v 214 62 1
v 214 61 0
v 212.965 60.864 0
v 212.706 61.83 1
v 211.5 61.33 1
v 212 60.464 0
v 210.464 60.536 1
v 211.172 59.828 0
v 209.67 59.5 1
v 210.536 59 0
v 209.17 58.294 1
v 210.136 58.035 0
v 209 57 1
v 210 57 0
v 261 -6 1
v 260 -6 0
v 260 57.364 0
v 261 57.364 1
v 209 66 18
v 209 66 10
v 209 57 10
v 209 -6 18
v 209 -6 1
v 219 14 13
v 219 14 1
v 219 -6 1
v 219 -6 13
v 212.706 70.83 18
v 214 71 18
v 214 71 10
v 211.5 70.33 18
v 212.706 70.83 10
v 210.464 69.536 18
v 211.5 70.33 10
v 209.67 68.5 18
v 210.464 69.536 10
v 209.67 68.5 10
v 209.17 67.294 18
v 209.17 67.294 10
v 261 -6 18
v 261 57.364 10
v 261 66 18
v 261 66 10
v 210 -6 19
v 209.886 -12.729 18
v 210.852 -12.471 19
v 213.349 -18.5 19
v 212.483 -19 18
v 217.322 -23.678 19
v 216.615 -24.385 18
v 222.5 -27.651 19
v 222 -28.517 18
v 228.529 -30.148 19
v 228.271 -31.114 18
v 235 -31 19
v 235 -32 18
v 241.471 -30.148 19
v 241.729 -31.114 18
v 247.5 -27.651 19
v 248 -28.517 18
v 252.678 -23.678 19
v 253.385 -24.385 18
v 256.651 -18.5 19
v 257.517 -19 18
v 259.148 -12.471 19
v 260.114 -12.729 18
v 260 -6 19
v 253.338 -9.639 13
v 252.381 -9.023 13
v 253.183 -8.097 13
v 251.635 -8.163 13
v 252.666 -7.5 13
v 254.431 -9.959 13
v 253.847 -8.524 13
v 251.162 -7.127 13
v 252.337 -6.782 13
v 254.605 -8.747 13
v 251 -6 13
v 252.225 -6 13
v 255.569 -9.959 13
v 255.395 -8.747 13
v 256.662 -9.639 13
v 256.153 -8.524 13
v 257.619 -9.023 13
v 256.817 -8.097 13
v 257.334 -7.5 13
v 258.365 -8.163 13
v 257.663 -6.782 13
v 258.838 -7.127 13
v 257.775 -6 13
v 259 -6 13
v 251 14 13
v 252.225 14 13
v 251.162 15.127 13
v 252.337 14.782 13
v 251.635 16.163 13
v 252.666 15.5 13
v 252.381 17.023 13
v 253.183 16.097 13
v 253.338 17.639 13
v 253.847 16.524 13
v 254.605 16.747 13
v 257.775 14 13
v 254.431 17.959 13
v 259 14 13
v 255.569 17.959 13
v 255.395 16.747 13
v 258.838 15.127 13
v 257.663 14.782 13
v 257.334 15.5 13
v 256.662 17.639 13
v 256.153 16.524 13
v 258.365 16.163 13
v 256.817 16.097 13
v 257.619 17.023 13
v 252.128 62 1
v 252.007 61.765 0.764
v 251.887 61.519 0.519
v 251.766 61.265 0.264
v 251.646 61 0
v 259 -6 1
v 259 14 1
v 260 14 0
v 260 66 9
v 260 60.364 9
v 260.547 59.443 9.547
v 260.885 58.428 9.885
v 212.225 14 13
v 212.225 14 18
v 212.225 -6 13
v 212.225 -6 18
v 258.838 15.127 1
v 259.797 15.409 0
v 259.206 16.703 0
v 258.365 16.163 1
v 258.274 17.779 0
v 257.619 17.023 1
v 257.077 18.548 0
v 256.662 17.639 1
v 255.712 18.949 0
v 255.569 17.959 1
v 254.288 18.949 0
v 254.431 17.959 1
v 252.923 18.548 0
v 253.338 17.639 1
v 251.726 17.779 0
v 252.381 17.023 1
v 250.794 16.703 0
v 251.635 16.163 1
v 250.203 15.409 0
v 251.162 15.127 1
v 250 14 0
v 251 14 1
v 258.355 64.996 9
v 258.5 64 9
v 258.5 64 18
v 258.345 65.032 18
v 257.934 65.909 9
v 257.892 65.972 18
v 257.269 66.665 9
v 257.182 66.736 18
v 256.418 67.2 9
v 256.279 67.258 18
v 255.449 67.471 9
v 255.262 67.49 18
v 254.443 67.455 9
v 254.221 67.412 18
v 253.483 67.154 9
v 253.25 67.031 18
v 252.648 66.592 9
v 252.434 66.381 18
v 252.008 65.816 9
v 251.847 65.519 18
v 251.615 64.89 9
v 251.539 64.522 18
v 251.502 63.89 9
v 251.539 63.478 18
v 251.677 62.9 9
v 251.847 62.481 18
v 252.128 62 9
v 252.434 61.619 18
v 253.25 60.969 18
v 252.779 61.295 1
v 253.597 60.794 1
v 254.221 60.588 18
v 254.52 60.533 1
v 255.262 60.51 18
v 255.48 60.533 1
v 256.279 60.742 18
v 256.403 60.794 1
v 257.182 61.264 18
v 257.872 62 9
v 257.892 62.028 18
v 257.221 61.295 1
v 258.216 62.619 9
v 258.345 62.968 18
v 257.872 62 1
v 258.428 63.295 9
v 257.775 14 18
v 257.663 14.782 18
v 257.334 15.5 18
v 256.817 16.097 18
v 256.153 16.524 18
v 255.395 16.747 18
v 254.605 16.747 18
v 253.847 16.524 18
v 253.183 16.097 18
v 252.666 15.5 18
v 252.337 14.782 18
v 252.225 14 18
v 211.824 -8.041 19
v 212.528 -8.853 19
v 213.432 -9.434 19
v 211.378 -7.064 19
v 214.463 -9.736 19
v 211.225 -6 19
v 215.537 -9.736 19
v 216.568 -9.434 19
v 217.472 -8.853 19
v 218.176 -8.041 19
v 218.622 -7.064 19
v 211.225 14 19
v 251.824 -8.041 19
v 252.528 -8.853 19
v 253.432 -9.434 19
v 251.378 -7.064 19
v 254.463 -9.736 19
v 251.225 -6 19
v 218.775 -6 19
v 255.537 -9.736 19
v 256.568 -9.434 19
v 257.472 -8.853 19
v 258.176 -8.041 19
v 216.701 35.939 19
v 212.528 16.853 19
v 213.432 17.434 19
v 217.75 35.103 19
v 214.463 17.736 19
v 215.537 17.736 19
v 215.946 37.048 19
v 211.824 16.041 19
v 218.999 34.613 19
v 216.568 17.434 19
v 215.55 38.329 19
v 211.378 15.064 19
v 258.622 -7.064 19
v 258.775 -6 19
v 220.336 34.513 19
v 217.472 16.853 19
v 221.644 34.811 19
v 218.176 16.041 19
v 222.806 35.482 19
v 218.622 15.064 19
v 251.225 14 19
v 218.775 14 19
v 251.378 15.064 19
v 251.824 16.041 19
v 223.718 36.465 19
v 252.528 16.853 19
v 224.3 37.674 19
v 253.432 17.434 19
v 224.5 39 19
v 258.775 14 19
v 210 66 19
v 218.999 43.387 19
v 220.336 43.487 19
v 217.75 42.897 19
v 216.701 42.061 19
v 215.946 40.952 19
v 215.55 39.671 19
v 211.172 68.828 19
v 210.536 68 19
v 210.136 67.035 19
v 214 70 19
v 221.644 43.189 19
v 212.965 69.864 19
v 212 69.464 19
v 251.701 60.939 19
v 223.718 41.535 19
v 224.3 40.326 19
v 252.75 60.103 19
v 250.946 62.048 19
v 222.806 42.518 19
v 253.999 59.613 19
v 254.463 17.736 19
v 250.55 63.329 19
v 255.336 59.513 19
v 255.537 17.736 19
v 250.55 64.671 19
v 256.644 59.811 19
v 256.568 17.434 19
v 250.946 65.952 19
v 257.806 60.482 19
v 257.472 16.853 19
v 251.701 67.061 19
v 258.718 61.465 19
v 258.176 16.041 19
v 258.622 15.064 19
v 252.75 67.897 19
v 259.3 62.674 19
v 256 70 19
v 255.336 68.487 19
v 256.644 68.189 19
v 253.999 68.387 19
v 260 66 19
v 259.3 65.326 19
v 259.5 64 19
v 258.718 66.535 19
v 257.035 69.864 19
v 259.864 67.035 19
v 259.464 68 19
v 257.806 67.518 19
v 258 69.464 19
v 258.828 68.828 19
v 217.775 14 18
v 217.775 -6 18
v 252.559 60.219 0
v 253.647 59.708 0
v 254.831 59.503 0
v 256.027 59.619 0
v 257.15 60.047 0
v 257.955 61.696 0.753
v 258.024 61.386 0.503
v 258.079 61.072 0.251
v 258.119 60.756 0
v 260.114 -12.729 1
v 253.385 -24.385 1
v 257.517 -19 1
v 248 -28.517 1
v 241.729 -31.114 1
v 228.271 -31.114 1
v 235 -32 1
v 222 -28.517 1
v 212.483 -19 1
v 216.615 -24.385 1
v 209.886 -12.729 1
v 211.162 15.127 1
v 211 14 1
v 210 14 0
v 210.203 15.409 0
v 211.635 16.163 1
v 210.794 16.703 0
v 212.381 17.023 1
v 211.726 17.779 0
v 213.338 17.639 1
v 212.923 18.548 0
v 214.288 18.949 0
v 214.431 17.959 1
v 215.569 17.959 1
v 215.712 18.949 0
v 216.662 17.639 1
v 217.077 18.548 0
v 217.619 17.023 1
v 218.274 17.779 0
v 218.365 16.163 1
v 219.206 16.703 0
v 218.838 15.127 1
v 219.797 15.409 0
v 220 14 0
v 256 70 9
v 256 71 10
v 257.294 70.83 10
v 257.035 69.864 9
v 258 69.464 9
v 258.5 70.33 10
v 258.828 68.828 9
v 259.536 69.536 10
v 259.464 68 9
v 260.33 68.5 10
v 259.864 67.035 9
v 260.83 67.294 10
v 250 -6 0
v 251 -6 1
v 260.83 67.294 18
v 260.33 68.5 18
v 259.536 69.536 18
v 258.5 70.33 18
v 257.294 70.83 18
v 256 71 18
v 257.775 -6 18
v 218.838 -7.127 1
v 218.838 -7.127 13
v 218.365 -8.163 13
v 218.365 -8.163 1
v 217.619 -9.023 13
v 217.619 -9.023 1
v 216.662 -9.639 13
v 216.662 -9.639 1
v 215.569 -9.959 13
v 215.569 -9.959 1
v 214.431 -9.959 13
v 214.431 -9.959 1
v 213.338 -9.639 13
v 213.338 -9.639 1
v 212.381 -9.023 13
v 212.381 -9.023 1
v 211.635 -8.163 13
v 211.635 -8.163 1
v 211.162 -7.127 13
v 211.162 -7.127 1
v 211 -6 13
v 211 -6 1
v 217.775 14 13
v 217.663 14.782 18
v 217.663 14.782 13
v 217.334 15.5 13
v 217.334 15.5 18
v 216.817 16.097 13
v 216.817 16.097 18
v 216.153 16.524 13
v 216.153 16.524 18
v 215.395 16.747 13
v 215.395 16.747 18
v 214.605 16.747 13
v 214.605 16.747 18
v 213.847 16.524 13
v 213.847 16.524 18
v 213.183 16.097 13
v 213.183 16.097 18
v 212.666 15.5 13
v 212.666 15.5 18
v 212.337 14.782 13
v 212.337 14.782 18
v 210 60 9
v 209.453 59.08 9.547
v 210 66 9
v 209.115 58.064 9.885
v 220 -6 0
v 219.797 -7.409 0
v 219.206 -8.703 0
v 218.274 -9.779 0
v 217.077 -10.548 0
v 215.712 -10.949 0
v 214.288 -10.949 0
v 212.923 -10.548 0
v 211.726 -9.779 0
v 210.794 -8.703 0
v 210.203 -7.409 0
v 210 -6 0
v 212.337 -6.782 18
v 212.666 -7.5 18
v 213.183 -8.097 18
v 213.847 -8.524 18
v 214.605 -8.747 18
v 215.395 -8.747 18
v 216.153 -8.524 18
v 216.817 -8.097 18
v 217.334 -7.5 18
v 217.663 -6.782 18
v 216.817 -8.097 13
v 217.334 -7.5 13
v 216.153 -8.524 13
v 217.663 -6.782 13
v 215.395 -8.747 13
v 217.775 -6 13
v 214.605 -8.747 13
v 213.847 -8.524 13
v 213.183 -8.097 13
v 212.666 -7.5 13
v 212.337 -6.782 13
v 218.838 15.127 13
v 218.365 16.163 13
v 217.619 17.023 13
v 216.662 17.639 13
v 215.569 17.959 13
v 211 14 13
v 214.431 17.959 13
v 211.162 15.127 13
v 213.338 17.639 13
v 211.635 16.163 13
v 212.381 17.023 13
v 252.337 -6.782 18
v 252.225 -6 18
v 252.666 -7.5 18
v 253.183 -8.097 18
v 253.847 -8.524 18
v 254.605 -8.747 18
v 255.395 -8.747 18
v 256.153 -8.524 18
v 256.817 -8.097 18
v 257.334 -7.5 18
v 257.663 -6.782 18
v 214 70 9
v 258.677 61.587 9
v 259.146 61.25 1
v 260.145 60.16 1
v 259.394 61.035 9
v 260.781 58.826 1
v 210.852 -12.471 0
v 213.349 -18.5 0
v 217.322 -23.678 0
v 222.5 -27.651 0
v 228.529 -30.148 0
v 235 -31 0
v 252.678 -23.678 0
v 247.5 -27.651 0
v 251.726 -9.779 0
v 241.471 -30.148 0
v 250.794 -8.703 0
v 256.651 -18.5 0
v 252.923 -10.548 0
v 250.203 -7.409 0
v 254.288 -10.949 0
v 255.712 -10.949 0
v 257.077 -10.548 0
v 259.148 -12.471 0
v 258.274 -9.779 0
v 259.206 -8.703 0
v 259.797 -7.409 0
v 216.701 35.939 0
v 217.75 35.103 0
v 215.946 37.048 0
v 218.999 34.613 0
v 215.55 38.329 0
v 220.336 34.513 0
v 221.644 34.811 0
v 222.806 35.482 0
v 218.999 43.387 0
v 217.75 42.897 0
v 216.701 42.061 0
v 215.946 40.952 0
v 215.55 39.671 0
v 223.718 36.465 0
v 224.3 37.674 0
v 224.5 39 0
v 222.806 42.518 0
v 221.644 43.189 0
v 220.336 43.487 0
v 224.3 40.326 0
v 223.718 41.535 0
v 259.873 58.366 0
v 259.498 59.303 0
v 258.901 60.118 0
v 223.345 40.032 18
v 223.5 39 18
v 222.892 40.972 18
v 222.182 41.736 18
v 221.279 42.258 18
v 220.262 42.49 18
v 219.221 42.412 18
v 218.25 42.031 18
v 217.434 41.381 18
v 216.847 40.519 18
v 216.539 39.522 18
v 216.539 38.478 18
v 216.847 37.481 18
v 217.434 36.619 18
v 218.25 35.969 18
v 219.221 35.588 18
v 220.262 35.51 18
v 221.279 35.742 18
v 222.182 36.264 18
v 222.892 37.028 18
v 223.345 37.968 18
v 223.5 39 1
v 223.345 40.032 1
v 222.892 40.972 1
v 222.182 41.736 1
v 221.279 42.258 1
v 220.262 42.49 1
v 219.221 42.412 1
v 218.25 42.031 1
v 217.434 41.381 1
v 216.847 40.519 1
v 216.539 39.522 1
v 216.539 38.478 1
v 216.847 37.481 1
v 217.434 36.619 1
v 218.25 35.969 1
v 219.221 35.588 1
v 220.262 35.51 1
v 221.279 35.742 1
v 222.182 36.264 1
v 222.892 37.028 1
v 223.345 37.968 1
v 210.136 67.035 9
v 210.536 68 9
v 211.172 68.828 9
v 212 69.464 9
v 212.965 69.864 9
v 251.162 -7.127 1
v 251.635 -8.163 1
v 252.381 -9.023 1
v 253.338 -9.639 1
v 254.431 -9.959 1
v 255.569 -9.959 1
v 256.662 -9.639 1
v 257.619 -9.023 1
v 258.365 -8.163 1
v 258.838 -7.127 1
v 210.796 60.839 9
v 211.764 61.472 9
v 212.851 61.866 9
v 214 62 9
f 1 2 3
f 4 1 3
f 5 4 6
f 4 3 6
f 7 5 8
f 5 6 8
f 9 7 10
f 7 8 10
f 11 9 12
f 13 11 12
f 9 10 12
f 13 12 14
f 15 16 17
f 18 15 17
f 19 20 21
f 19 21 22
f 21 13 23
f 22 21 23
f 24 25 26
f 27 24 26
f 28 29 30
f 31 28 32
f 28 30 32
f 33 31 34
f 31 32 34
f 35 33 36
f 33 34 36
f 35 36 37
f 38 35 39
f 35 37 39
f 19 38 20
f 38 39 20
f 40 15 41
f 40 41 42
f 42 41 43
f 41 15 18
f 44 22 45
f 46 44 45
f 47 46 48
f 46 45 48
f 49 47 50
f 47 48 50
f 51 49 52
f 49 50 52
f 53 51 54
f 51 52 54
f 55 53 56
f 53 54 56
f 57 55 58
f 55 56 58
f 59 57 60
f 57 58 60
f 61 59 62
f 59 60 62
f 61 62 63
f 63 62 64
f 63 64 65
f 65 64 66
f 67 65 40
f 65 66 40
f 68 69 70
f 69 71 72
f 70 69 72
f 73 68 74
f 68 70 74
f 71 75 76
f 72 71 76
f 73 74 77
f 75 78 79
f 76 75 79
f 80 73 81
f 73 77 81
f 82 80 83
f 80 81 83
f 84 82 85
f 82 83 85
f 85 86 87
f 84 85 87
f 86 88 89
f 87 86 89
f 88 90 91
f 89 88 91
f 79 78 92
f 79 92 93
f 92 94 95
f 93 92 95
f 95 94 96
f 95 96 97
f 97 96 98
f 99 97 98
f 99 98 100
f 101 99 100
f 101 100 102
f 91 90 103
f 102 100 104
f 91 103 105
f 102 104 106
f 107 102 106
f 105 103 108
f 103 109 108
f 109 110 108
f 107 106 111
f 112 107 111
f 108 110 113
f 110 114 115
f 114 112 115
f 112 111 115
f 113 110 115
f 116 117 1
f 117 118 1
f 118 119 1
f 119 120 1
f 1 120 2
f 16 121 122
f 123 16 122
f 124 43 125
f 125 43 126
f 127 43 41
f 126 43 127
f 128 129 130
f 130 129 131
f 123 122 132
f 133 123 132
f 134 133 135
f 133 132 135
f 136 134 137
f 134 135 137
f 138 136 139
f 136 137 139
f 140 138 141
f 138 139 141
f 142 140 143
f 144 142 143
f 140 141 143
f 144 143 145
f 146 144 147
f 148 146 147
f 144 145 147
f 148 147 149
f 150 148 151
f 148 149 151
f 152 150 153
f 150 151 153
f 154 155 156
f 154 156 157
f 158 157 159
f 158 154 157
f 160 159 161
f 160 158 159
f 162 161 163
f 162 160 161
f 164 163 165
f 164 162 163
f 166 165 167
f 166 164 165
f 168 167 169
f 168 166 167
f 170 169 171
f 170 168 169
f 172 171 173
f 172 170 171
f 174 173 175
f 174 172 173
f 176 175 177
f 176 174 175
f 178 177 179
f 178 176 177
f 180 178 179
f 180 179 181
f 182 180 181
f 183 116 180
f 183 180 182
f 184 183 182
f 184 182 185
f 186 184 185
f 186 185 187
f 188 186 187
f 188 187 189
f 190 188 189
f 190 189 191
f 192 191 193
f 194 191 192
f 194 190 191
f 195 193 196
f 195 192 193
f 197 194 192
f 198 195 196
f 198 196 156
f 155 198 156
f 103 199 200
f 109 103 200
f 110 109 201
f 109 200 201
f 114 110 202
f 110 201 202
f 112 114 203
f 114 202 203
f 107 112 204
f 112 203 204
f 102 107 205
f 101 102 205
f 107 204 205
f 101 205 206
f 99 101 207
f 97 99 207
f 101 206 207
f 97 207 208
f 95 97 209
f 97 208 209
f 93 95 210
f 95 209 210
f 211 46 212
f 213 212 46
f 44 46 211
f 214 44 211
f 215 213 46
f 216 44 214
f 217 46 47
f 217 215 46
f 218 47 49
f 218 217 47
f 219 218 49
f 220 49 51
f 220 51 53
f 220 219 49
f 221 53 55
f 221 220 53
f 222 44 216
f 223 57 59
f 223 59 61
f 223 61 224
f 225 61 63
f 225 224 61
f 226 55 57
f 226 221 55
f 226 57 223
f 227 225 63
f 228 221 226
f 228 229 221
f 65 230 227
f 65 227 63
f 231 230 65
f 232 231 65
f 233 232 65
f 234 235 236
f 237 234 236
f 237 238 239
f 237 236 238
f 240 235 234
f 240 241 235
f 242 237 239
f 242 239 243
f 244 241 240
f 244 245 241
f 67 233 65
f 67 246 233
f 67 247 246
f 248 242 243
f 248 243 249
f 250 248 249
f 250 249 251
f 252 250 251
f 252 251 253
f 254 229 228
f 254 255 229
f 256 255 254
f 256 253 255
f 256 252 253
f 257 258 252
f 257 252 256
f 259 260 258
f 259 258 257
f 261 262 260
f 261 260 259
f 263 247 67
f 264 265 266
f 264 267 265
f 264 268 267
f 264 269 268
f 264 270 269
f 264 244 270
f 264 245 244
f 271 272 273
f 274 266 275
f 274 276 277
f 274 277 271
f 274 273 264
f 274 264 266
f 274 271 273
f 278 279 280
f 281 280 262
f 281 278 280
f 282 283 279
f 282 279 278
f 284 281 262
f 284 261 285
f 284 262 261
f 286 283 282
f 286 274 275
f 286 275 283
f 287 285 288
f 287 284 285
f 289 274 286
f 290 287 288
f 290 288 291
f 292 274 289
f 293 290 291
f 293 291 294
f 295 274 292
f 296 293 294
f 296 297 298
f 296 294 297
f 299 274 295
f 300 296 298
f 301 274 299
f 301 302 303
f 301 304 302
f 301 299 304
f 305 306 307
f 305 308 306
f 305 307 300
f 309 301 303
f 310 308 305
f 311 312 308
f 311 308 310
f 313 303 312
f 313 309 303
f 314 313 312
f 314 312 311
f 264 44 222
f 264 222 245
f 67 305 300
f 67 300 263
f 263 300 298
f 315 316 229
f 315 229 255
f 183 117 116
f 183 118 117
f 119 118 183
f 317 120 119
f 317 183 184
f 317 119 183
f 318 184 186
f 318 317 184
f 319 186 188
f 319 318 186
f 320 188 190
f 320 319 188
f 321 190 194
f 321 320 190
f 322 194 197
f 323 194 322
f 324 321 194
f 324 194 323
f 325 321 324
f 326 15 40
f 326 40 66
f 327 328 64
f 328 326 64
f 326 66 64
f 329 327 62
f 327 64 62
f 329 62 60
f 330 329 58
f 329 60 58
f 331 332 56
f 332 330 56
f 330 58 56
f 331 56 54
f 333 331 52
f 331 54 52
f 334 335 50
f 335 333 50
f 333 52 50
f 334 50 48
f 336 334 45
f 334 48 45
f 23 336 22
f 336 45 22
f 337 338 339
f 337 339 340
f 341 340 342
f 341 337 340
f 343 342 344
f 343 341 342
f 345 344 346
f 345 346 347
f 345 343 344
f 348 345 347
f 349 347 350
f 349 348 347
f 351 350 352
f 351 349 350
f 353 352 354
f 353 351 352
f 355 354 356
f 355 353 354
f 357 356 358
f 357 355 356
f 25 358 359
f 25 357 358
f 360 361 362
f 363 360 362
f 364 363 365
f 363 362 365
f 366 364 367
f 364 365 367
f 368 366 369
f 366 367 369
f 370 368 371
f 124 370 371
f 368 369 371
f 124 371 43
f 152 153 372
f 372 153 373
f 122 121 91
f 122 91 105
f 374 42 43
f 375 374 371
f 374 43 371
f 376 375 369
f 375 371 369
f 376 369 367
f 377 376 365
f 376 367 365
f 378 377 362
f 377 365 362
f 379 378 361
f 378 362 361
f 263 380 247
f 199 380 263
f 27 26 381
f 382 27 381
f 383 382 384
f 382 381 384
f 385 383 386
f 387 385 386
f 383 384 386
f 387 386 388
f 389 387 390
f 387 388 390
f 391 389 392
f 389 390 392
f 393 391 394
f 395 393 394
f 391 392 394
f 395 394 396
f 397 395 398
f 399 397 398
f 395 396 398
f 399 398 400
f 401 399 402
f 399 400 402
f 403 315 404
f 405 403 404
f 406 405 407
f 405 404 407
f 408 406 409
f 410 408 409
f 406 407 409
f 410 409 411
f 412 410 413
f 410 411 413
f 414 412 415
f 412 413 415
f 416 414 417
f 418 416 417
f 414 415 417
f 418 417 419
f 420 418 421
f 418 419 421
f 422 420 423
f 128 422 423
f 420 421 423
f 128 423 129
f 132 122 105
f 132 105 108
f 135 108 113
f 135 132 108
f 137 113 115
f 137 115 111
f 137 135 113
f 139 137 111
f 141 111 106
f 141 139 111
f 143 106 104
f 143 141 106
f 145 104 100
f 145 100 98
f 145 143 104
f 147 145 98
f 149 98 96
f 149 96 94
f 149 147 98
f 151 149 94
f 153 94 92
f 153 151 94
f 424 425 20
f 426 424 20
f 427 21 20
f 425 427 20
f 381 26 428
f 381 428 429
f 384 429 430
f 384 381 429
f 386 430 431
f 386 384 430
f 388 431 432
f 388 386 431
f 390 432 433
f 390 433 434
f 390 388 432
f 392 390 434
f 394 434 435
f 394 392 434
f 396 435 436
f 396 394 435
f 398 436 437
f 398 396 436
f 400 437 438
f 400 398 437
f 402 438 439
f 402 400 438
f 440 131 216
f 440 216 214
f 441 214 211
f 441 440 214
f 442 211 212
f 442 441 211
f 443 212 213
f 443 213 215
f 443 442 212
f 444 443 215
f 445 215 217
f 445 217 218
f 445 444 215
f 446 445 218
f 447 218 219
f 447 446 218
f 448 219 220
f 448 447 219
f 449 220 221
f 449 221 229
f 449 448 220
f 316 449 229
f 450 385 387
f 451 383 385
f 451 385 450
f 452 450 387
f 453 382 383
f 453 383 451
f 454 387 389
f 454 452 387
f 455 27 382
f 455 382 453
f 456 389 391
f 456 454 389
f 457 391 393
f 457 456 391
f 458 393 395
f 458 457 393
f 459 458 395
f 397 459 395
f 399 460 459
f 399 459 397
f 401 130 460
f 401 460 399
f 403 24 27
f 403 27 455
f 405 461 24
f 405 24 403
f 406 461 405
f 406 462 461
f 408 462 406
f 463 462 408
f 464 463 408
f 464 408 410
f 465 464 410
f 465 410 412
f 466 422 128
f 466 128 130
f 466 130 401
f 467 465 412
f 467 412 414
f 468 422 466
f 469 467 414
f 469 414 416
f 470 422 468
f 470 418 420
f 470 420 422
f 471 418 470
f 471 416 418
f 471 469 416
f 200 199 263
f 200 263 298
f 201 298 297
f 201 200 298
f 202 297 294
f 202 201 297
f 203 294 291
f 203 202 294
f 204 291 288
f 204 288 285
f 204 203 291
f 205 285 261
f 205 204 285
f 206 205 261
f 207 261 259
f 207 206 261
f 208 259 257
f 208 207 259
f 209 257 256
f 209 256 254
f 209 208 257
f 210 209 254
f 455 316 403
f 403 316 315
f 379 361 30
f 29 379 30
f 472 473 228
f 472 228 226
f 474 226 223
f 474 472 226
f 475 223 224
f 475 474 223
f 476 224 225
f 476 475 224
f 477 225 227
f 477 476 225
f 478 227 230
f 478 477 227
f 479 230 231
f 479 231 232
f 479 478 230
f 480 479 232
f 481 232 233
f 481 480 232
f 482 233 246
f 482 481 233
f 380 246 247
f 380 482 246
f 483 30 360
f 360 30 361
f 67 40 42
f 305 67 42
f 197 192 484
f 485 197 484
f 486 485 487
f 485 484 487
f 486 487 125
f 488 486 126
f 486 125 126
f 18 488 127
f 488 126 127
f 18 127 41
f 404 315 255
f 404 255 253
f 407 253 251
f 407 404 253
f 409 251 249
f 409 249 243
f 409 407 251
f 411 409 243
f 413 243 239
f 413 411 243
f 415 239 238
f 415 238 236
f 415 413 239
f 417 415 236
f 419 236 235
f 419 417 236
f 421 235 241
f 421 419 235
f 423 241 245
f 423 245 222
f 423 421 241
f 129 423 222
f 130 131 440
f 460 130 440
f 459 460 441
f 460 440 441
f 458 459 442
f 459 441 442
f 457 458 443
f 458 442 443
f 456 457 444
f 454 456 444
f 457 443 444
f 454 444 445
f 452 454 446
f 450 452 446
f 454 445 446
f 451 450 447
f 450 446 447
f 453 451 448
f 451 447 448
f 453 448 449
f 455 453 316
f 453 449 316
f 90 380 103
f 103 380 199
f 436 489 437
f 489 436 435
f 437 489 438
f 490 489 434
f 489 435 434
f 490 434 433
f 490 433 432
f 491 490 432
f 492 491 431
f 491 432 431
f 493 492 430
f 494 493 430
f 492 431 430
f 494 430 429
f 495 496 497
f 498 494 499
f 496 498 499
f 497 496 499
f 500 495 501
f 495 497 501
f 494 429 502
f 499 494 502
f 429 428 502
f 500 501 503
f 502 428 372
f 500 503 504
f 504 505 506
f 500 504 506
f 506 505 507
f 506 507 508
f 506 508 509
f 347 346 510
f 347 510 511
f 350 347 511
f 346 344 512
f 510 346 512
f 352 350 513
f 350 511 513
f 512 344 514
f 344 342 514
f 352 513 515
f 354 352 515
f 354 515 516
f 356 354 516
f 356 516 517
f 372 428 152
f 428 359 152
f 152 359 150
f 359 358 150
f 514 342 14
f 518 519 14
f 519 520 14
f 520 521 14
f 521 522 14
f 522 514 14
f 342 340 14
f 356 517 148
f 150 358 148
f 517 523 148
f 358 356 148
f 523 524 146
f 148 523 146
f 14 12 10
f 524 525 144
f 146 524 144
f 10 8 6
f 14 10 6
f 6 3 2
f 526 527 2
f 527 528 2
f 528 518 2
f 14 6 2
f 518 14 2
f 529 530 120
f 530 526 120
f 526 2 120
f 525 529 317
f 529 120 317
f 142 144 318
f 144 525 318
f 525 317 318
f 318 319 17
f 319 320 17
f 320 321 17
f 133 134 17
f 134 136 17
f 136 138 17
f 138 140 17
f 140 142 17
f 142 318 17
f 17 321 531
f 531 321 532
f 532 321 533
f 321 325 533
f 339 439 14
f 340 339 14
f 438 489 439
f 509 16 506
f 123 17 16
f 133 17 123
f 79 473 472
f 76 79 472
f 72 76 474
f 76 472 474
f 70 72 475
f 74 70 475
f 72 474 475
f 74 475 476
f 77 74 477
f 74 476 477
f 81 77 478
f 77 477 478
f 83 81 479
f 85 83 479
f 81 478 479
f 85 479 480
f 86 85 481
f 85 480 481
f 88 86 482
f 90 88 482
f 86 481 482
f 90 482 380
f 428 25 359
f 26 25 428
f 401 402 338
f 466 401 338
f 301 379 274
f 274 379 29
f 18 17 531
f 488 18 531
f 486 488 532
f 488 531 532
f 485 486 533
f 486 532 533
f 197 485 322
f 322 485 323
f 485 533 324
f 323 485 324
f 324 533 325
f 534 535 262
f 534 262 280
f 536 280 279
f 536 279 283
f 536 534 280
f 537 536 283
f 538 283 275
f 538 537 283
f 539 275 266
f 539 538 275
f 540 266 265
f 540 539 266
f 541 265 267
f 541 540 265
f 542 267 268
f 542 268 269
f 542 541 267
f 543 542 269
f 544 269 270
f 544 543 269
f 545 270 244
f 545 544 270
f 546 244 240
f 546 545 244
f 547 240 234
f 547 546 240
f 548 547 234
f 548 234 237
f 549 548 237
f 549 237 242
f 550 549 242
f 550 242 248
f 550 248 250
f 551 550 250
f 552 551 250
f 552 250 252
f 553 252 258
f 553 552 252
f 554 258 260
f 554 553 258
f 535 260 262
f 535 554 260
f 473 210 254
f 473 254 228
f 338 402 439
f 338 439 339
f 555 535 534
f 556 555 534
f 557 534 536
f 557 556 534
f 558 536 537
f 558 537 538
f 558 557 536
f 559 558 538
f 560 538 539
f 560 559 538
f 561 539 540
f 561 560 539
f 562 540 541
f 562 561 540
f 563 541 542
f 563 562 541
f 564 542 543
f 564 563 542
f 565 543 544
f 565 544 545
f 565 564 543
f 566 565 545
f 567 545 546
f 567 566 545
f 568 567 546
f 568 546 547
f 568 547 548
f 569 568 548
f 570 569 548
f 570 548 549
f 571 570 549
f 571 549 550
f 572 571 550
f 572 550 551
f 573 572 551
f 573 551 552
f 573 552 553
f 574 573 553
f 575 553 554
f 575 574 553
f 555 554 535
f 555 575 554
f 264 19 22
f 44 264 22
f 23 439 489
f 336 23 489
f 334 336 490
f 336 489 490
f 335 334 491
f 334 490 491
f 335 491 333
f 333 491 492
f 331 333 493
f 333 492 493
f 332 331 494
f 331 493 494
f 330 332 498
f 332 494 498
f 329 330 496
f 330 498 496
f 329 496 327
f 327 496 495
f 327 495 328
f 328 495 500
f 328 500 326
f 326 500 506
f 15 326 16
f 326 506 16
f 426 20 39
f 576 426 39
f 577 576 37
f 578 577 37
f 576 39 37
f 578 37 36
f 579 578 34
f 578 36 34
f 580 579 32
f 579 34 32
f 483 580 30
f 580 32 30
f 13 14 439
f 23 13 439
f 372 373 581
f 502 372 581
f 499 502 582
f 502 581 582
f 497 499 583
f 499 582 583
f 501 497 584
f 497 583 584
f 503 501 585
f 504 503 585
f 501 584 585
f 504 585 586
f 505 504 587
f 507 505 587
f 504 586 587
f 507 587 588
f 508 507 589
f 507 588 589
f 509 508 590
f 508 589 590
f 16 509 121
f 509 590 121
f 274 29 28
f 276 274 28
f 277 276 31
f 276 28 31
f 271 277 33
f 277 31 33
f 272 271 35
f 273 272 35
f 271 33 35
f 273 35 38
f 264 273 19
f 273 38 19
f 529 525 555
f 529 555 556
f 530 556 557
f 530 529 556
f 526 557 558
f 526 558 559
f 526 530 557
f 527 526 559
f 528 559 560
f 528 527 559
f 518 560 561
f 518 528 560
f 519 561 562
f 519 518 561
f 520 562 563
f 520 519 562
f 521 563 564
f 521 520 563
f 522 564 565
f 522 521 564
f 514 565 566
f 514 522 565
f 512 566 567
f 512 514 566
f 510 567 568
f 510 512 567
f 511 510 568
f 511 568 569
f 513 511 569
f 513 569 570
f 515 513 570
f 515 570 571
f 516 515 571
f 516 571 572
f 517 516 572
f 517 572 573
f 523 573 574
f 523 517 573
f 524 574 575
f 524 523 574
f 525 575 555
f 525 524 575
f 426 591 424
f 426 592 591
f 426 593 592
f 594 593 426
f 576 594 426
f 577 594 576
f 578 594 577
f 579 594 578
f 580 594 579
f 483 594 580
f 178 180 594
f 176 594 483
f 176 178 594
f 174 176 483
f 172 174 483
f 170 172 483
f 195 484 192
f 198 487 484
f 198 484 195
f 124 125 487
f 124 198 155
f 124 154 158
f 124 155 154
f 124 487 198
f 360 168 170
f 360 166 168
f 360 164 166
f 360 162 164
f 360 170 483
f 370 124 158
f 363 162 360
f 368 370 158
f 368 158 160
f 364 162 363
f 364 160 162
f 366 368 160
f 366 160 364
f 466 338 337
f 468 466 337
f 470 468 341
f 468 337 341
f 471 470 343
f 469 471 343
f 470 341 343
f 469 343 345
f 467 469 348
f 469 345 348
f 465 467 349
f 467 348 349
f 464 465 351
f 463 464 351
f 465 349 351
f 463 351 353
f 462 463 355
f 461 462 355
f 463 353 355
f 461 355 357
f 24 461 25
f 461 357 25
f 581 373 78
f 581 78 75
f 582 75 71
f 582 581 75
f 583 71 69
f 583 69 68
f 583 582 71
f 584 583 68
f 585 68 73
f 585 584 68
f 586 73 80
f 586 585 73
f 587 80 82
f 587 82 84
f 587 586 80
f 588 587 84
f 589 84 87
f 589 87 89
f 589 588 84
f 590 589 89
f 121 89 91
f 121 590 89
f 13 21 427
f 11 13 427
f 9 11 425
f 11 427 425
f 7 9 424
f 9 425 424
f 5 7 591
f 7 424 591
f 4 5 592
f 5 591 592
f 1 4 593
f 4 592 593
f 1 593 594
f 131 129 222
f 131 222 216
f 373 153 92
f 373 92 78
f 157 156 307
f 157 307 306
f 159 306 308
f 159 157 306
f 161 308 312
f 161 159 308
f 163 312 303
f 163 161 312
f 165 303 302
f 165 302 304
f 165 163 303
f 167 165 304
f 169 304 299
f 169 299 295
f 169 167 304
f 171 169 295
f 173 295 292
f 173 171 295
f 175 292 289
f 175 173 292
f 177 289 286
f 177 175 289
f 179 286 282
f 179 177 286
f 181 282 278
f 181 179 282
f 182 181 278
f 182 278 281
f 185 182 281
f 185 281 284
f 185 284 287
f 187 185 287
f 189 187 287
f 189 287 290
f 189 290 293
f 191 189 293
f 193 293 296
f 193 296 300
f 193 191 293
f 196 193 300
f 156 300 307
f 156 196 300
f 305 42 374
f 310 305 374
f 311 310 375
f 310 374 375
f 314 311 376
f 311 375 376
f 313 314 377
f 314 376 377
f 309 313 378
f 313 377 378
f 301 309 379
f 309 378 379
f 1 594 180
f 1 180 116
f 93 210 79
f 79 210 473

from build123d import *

# Parameters (mm, degrees)
SKETCH1_R           = 3.5
BOSS_EXTRUDE1_DEPTH = 19
CUT_EXTRUDE1_DEPTH  = 272.151249306
CUT_EXTRUDE2_DEPTH  = 272.151249306
CUT_EXTRUDE3_DEPTH  = 13
SKETCH5_W           = 9
SKETCH5_H           = 9
CUT_EXTRUDE4_DEPTH  = 91.033327163
FILLET1_R           = 5
CHAMFER1_SIZE       = 1


# Some blends are built 0.0001 mm under size
with BuildPart() as part:
    # Sketch1 → Boss-Extrude1 (new body)
    with BuildSketch(Plane.XY):
        Polygon((261, 71), (260, 71), (255, 71), (210, 71), (209, 71), (209, 41), (209, -59), (210, -59), (260, -59), (261, -59), align=None)
        with Locations((255, 64)):
            Circle(SKETCH1_R, mode=Mode.SUBTRACT)
        with Locations((220, 39)):
            Circle(SKETCH1_R, mode=Mode.SUBTRACT)
    extrude(amount=BOSS_EXTRUDE1_DEPTH)

    # Sketch2 → Cut-Extrude1 (cut, through all)
    with BuildSketch(Plane.XY.offset(19)):
        with BuildLine():
            Line((209, -59), (261, -59))
            Line((261, -59), (261, -6))
            ThreePointArc((261, -6), (235, -32), (209, -6))
            Line((209, -6), (209, -59))
        make_face()
    extrude(amount=-CUT_EXTRUDE1_DEPTH, mode=Mode.SUBTRACT)

    # Sketch3 → Cut-Extrude2 (cut, through all)
    with BuildSketch(Plane.XY.offset(19)):
        with BuildLine():
            Line((212.225, 14), (212.225, -6))
            ThreePointArc((212.225, -6), (215, -8.775), (217.775, -6))
            Line((217.775, -6), (217.775, 14))
            ThreePointArc((217.775, 14), (215, 16.775), (212.225, 14))
        make_face()
        with BuildLine():
            Line((252.225, 14), (252.225, -6))
            ThreePointArc((252.225, -6), (255, -8.775), (257.775, -6))
            Line((257.775, -6), (257.775, 14))
            ThreePointArc((257.775, 14), (255, 16.775), (252.225, 14))
        make_face()
    extrude(amount=-CUT_EXTRUDE2_DEPTH, mode=Mode.SUBTRACT)

    # Sketch4 → Cut-Extrude3 (cut)
    with BuildSketch(Plane(origin=(0, 0, 0), x_dir=(-1, 0, 0), z_dir=(0, 0, -1))):
        with BuildLine():
            Line((-251, 14), (-251, -6))
            ThreePointArc((-251, -6), (-255, -10), (-259, -6))
            Line((-259, -6), (-259, 14))
            ThreePointArc((-259, 14), (-255, 18), (-251, 14))
        make_face()
        with BuildLine():
            Line((-219, 14), (-219, -6))
            ThreePointArc((-219, -6), (-215, -10), (-211, -6))
            Line((-211, -6), (-211, 14))
            ThreePointArc((-211, 14), (-215, 18), (-219, 14))
        make_face()
    extrude(amount=-CUT_EXTRUDE3_DEPTH, mode=Mode.SUBTRACT)

    # Sketch5 → Cut-Extrude4 (cut, through all)
    with BuildSketch(Plane(origin=(261, 0, 0), x_dir=(0, 0, -1), z_dir=(1, 0, 0))):
        with Locations((-4.5, 66.5)):
            Rectangle(SKETCH5_W, SKETCH5_H)
    extrude(amount=-CUT_EXTRUDE4_DEPTH, mode=Mode.SUBTRACT)

    # Fillet1
    # the kernel refuses this fillet: 5 mm, written as the material it takes off along each edge
    with BuildSketch(Plane(origin=(209, 62, 9), x_dir=(0, -1, 0), z_dir=(0, 0, -1))) as fillet1_piece_1:
        with BuildLine():
            CenterArc((FILLET1_R, -FILLET1_R), FILLET1_R, 90, 90)
            Line((0, -FILLET1_R), (-FILLET1_R * 0.02, -FILLET1_R))
            Line((-FILLET1_R * 0.02, -FILLET1_R), (-FILLET1_R * 0.02, FILLET1_R * 0.02))
            Line((-FILLET1_R * 0.02, FILLET1_R * 0.02), (FILLET1_R, FILLET1_R * 0.02))
            Line((FILLET1_R, FILLET1_R * 0.02), (FILLET1_R, 0))
        make_face()
    extrude(amount=21.5, mode=Mode.SUBTRACT)
    with BuildSketch(Plane(origin=(261, 62, 9), x_dir=(0, -1, 0), z_dir=(0, 0, -1))) as fillet1_piece_2:
        with BuildLine():
            CenterArc((4.636222886, 5), FILLET1_R, 201.990710665, 68.009289335)
            Line((0, 3.127718677), (-0.092724458, 3.09027305))
            ThreePointArc((-0.092724458, 3.09027305), (-0.1, 1.563859338), (-0.1, 0))
            Line((-0.1, 0), (0, -0.1))
            Line((0, -0.1), (4.636222886, -0.1))
            Line((4.636222886, -0.1), (4.636222886, 0))
        make_face()
    extrude(amount=20.590557214, mode=Mode.SUBTRACT)
    with BuildSketch(Plane(origin=(209, 71, -3.5), x_dir=(1, 0, 0), z_dir=(0, 0, 1))) as fillet1_piece_3:
        with BuildLine():
            CenterArc((FILLET1_R, -FILLET1_R), FILLET1_R, 90, 90)
            Line((0, -FILLET1_R), (-FILLET1_R * 0.02, -FILLET1_R))
            Line((-FILLET1_R * 0.02, -FILLET1_R), (-FILLET1_R * 0.02, FILLET1_R * 0.02))
            Line((-FILLET1_R * 0.02, FILLET1_R * 0.02), (FILLET1_R, FILLET1_R * 0.02))
            Line((FILLET1_R, FILLET1_R * 0.02), (FILLET1_R, 0))
        make_face()
    extrude(amount=35, mode=Mode.SUBTRACT)
    with BuildSketch(Plane(origin=(261, 71, -3.5), x_dir=(-1, 0, 0), z_dir=(0, 0, 1))) as fillet1_piece_4:
        with BuildLine():
            CenterArc((FILLET1_R, FILLET1_R), FILLET1_R, 180, 90)
            Line((0, FILLET1_R), (-FILLET1_R * 0.02, FILLET1_R))
            Line((-FILLET1_R * 0.02, FILLET1_R), (-FILLET1_R * 0.02, -FILLET1_R * 0.02))
            Line((-FILLET1_R * 0.02, -FILLET1_R * 0.02), (FILLET1_R, -FILLET1_R * 0.02))
            Line((FILLET1_R, -FILLET1_R * 0.02), (FILLET1_R, 0))
        make_face()
    extrude(amount=35, mode=Mode.SUBTRACT)

    # Chamfer1
    chamfer1_edges = [part.edges().sort_by_distance(p)[0] for p in [
        (255, 60.5, 0),
        (216.5, 39, 0),
        (251.5, 64, 19),
        (209, 61.5, 9),
        (209, 25.5, 0),
        (209, 30, 19),
        (233.063859338, 62, 0),
        (261, 25.681888557, 0),
        (260.144961195, 60.160077651, 0),
        (210.464466094, 60.535533906, 0),
        (261, 61.681888557, 9),
        (261, 30, 19),
        (235, 71, 9),
        (259.535533906, 69.535533906, 9),
        (210.464466094, 69.535533906, 9),
        (235, 71, 19),
        (259.535533906, 69.535533906, 19),
        (210.464466094, 69.535533906, 19),
        (235, -32, 0),
        (235, -32, 19),
        (255, 16.775, 19),
        (252.225, 4, 19),
        (255, -8.775, 19),
        (257.775, 4, 19),
        (215, 16.775, 19),
        (212.225, 4, 19),
        (215, -8.775, 19),
        (217.775, 4, 19),
        (216.5, 39, 19),
        (255, 18, 0),
        (259, 4, 0),
        (255, -10, 0),
        (251, 4, 0),
        (215, 18, 0),
        (219, 4, 0),
        (215, -10, 0),
        (211, 4, 0),
    ]]
    chamfer(chamfer1_edges, length=CHAMFER1_SIZE - 0.0001)  # a hair under: the kernel refuses the full size


solid = part.part
